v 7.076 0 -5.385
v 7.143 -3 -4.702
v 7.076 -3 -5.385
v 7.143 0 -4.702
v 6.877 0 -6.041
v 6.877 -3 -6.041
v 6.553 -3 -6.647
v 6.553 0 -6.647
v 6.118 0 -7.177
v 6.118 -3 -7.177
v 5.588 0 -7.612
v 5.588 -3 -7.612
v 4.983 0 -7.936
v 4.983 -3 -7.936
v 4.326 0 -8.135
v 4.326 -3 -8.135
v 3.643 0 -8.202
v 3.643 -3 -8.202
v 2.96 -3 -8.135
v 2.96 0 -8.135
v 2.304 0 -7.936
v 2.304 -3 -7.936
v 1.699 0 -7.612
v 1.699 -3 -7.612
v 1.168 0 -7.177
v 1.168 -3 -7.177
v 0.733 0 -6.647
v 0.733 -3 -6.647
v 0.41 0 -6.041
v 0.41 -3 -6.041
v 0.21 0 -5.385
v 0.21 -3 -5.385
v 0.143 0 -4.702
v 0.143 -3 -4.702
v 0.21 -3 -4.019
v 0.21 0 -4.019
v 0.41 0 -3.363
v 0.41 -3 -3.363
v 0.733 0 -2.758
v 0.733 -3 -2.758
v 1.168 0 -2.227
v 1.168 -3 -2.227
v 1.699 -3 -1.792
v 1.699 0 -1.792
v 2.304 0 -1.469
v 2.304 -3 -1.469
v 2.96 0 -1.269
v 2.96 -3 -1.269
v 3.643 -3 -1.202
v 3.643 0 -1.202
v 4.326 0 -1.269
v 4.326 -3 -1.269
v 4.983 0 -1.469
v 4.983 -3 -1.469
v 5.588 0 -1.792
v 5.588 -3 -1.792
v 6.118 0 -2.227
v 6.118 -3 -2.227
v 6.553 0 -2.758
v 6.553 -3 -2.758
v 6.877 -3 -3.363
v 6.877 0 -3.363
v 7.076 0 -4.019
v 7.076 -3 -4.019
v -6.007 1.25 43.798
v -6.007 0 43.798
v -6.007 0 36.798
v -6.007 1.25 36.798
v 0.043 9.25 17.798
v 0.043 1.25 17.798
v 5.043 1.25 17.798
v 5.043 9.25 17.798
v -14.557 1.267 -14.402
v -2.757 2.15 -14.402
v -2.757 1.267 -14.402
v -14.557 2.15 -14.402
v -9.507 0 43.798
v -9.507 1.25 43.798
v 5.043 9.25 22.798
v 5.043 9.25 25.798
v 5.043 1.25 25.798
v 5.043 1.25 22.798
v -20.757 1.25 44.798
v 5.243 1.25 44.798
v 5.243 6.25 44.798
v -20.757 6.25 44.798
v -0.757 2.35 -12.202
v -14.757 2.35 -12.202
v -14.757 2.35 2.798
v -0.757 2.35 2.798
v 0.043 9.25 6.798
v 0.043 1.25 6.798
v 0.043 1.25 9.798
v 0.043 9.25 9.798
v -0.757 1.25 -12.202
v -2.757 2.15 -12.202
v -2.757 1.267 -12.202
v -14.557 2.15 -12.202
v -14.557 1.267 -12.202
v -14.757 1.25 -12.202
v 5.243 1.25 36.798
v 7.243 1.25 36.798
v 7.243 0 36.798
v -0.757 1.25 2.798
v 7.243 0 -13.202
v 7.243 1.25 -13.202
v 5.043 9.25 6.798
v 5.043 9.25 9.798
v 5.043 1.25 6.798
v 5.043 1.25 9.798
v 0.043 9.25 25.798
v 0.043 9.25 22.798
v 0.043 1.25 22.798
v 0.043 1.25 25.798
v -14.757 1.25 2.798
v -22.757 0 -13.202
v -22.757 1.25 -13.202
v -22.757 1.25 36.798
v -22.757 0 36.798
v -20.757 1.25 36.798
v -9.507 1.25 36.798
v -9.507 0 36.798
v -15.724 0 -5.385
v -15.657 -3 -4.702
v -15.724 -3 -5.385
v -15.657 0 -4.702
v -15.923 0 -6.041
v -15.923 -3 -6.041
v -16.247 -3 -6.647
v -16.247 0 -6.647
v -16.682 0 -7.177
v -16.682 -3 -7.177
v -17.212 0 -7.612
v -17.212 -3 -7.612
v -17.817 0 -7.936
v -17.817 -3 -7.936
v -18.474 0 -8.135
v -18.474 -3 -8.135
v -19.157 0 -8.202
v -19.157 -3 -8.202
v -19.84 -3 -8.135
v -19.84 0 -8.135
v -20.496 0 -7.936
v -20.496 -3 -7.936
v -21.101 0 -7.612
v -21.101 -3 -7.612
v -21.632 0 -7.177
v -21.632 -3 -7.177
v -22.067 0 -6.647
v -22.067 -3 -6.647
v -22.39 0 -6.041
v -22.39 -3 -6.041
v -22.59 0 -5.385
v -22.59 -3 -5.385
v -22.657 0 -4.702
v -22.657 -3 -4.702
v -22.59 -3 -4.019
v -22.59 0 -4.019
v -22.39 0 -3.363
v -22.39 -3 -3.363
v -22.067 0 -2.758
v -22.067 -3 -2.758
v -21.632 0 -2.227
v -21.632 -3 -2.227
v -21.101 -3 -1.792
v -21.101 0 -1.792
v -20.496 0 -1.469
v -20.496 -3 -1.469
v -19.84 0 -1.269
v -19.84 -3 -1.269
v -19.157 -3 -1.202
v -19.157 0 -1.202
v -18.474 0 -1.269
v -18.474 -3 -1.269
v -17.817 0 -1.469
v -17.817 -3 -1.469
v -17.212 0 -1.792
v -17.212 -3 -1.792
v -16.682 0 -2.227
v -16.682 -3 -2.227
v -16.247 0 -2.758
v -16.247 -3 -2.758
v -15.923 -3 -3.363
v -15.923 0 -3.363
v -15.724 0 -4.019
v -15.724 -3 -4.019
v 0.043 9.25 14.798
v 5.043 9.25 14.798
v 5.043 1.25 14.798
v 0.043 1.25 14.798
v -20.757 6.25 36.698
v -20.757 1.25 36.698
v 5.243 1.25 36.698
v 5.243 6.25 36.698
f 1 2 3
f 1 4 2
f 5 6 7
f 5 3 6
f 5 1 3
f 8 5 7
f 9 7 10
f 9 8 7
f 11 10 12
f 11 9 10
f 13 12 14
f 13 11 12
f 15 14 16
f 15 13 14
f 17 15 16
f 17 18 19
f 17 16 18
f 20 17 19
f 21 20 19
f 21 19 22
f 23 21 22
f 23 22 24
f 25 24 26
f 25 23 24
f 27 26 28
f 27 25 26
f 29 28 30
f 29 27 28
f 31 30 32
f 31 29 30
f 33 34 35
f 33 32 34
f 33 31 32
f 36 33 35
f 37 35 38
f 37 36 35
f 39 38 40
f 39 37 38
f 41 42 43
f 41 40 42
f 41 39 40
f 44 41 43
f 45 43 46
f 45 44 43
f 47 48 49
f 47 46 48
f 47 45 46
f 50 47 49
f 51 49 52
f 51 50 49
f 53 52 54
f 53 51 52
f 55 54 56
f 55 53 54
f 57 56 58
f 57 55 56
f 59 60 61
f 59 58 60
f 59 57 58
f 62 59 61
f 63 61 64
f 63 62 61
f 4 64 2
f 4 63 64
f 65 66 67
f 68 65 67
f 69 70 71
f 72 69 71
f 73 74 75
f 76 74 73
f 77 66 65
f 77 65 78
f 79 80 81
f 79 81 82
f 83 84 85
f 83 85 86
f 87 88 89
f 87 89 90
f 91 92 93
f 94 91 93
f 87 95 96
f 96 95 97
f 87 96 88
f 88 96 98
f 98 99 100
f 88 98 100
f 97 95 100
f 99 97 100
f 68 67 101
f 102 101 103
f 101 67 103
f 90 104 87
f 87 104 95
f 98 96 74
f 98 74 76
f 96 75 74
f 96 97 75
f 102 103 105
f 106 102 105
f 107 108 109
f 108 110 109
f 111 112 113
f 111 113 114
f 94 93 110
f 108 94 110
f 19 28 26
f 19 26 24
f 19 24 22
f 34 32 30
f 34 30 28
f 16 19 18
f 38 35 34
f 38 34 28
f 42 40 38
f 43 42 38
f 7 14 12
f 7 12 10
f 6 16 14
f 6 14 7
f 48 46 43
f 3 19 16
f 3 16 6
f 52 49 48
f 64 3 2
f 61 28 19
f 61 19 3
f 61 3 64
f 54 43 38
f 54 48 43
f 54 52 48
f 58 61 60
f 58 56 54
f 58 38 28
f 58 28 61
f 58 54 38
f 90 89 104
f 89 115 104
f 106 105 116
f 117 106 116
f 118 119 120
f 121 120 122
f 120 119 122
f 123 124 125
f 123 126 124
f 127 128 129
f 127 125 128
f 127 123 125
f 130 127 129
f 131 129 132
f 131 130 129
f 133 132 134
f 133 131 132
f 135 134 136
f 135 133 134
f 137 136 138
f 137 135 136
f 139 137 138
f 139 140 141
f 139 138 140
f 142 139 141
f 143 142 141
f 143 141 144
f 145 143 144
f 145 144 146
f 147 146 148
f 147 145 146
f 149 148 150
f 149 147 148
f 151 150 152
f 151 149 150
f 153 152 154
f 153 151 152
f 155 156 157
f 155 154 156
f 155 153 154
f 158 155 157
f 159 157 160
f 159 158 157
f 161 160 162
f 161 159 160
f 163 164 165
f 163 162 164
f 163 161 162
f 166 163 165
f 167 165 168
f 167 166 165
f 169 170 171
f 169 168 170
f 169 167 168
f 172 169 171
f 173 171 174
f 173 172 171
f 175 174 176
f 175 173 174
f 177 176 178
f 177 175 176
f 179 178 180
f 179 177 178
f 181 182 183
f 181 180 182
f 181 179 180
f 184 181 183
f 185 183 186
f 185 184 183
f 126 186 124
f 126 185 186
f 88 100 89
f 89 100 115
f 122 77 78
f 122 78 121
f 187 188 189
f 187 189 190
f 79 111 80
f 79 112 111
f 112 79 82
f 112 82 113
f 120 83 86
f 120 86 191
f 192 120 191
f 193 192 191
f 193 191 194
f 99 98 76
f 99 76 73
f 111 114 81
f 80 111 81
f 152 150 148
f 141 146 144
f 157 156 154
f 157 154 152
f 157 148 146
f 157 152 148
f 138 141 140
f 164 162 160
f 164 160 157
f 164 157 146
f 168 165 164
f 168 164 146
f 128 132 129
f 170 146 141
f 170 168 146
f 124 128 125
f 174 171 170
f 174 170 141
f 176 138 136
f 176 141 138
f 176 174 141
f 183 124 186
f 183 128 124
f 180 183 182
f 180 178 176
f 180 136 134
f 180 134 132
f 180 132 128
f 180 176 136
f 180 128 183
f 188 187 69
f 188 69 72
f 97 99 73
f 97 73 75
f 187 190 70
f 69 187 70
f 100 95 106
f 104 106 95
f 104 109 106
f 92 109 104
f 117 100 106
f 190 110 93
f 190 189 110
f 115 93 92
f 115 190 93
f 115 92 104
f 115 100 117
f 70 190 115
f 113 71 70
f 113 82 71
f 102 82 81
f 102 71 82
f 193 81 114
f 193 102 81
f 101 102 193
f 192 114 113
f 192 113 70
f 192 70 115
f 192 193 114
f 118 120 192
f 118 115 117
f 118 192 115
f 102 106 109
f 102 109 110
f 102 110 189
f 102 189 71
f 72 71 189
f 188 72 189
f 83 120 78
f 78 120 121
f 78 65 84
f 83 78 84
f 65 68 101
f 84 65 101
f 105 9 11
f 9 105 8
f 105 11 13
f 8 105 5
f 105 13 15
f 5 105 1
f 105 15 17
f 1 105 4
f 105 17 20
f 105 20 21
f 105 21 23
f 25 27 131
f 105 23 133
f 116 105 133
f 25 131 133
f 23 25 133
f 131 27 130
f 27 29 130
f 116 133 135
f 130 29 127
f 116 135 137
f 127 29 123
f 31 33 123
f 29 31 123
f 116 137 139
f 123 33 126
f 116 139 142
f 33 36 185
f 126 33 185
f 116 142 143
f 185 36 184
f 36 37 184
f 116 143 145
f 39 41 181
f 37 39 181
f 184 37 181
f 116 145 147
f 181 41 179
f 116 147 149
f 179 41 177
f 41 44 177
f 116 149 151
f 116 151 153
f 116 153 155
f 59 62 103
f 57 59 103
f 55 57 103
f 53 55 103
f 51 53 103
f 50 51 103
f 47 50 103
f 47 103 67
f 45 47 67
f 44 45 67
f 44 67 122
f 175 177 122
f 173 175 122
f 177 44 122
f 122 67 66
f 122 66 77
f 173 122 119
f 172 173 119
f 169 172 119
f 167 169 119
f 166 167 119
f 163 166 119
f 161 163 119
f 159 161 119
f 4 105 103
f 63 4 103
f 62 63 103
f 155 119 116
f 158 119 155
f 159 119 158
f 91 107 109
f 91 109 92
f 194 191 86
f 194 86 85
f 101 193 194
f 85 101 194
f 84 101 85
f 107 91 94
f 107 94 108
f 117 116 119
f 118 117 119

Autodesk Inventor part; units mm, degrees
ref_plane "YZ Plane" through (0, 0, 0) normal (1, 0, 0) x (0, 1, 0)
ref_plane "XZ Plane" through (0, 0, 0) normal (0, 1, 0) x (-1, 0, 0)
ref_plane "XY Plane" through (0, 0, 0) normal (0, 0, 1) x (1, 0, 0)
sketch "Sketch1" plane through (0, 0, 0) normal (0, 1, 0) x (-1, 0, 0)
  line L0 (22.7568, 36.7979) -> (-7.2432, 36.7979)
  line L1 (-7.2432, 36.7979) -> (-7.2432, -13.2021)
  line L2 (-7.2432, -13.2021) -> (22.7568, -13.2021)
  line L3 (22.7568, -13.2021) -> (22.7568, 36.7979)
  line L4 (7.7568, 36.7979) -> (7.7568, 43.7979)
  line L5 (7.7568, 43.7979) -> (9.5068, 43.7979)
  line L6 (9.5068, 43.7979) -> (9.5068, 36.7979)
  line L7 (9.5068, 43.7979) -> (6.0068, 43.7979)
  line L8 (6.0068, 43.7979) -> (6.0068, 36.7979)
  point P0 (0, 0)
  dimension "d0" = 30
  dimension "d1" = 50
  dimension "d2" = 7
  dimension "d3" = 1.75
  dimension "d4" = 3.5
extrude "Extrusion1" add sketch "Sketch1" along normal blind 1.25
sketch "Sketch2" plane through (0, 1.25, 0) normal (0, 1, 0) x (1, 0, 0)
  line L0 (-20.7568, -36.6979) -> (5.2432, -36.6979)
  line L1 (5.2432, -36.6979) -> (5.2432, -44.7979)
  line L2 (5.2432, -44.7979) -> (-20.7568, -44.7979)
  line L3 (-20.7568, -44.7979) -> (-20.7568, -36.6979)
  line L4 (-9.5068, -43.7979) -> (-6.0068, -43.7979) projected
  line L5 (-6.0068, -43.7979) -> (-9.5068, -43.7979)
  line L6 (-22.7568, 13.2021) -> (-22.7568, -36.7979) projected
  line L7 (7.2432, -36.7979) -> (7.2432, 13.2021) projected
  point P0 (0, 0)
  point P1 (-7.7568, -43.7979)
  point P2 (5.2432, -40.7479)
  dimension "d7" = 1
  dimension "d8" = 8.1
  dimension "d9" = 2
  dimension "d10" = 2
extrude "Extrusion2" add sketch "Sketch2" along normal blind 5
sketch "Sketch3" plane through (0, 1.25, 0) normal (0, 1, 0) x (1, 0, 0)
  line L0 (0.0432, -9.7979) -> (5.0432, -9.7979)
  line L1 (5.0432, -9.7979) -> (5.0432, -6.7979)
  line L2 (5.0432, -6.7979) -> (0.0432, -6.7979)
  line L3 (0.0432, -6.7979) -> (0.0432, -9.7979)
  line L4 (0.0432, -17.7979) -> (5.0432, -17.7979)
  line L5 (5.0432, -17.7979) -> (5.0432, -14.7979)
  line L6 (5.0432, -14.7979) -> (0.0432, -14.7979)
  line L7 (0.0432, -14.7979) -> (0.0432, -17.7979)
  line L8 (0.0432, -25.7979) -> (5.0432, -25.7979)
  line L9 (5.0432, -25.7979) -> (5.0432, -22.7979)
  line L10 (5.0432, -22.7979) -> (0.0432, -22.7979)
  line L11 (0.0432, -22.7979) -> (0.0432, -25.7979)
  line L12 (7.2432, -36.7979) -> (7.2432, 13.2021) projected
  line L13 (7.2432, 13.2021) -> (-22.7568, 13.2021) projected
  point P0 (0, 0)
  point P1 (-0.1282, -6.8631)
  point P2 (-0.0024, -12.7771)
  point P3 (5.0432, -8.2979)
  point P4 (5.0432, -16.2979)
  point P5 (5.0432, -24.2979)
  point P6 (2.5432, -17.7979)
  point P7 (2.5432, -22.7979)
  dimension "d13" = 5
  dimension "d14" = 3
  dimension "d15" = 5
  dimension "d16" = 3
  dimension "d17" = 5
  dimension "d18" = 3
  dimension "d19" = 2.2
  dimension "d20" = 2.2
  dimension "d21" = 2.2
  dimension "d22" = 20
  dimension "d23" = 5
  dimension "d24" = 5
extrude "Extrusion3" add sketch "Sketch3" along normal blind 8
sketch "Sketch4" plane through (0, 1.25, 0) normal (0, 1, 0) x (1, 0, 0)
  line L0 (-14.7568, -2.7979) -> (-0.7568, -2.7979)
  line L1 (-0.7568, -2.7979) -> (-0.7568, 12.2021)
  line L2 (-0.7568, 12.2021) -> (-14.7568, 12.2021)
  line L3 (-14.7568, 12.2021) -> (-14.7568, -2.7979)
  line L4 (-22.7568, 13.2021) -> (-22.7568, -36.7979) projected
  line L5 (7.2432, -36.7979) -> (7.2432, 13.2021) projected
  line L6 (7.2432, 13.2021) -> (-22.7568, 13.2021) projected
  point P0 (0, 0)
  dimension "d27" = 8
  dimension "d28" = 8
  dimension "d29" = 1
  dimension "d30" = 15
extrude "Extrusion4" add sketch "Sketch4" along normal blind 1.1
sketch "Sketch5" plane through (-0.7568, 1.25, -12.2021) normal (0, 0, -1) x (-1, 0, 0)
  line L0 (2, 0.9) -> (13.8, 0.9)
  line L1 (13.8, 0.9) -> (13.8, 0.017)
  line L2 (13.8, 0.017) -> (2, 0.017)
  line L3 (2, 0.017) -> (2, 0.9)
  line L4 (0, 0) -> (0, 1.1) projected
  line L5 (14, 0) -> (14, 1.1) projected
  line L6 (0, 1.1) -> (14, 1.1) projected
  line L7 (-8, 0) -> (22, 0) projected
  point P0 (-0.7568, -1.25)
  point P1 (0, 0.55)
  point P2 (2, 0.4585)
  point P3 (14, 0.55)
  point P4 (13.8, 0.4585)
  dimension "d33" = 2
  dimension "d34" = 0.2
  dimension "d35" = 0.2
  dimension "d36" = 0.017
extrude "Extrusion5" add sketch "Sketch5" along normal blind 2.2 contours L0 L1 L2 L3
sketch "Sketch6" plane through (0, 0, 0) normal (0, -1, 0) x (1, 0, 0)
  circle A0 centre (3.6432, -4.7021) radius 3.5
  circle A1 centre (-19.1568, -4.7021) radius 3.5
  line L0 (7.2432, -13.2021) -> (-22.7568, -13.2021) projected
  line L1 (-22.7568, -13.2021) -> (-22.7568, 36.7979) projected
  line L2 (7.2432, 36.7979) -> (7.2432, -13.2021) projected
  point P0 (0, 0)
  dimension "d39" = 7
  dimension "d40" = 7
  dimension "d41" = 8.5
  dimension "d42" = 8.5
  dimension "d43" = 3.6
  dimension "d44" = 3.6
extrude "Extrusion6" add sketch "Sketch6" along normal blind 3
properties part number "Sd card reader"
